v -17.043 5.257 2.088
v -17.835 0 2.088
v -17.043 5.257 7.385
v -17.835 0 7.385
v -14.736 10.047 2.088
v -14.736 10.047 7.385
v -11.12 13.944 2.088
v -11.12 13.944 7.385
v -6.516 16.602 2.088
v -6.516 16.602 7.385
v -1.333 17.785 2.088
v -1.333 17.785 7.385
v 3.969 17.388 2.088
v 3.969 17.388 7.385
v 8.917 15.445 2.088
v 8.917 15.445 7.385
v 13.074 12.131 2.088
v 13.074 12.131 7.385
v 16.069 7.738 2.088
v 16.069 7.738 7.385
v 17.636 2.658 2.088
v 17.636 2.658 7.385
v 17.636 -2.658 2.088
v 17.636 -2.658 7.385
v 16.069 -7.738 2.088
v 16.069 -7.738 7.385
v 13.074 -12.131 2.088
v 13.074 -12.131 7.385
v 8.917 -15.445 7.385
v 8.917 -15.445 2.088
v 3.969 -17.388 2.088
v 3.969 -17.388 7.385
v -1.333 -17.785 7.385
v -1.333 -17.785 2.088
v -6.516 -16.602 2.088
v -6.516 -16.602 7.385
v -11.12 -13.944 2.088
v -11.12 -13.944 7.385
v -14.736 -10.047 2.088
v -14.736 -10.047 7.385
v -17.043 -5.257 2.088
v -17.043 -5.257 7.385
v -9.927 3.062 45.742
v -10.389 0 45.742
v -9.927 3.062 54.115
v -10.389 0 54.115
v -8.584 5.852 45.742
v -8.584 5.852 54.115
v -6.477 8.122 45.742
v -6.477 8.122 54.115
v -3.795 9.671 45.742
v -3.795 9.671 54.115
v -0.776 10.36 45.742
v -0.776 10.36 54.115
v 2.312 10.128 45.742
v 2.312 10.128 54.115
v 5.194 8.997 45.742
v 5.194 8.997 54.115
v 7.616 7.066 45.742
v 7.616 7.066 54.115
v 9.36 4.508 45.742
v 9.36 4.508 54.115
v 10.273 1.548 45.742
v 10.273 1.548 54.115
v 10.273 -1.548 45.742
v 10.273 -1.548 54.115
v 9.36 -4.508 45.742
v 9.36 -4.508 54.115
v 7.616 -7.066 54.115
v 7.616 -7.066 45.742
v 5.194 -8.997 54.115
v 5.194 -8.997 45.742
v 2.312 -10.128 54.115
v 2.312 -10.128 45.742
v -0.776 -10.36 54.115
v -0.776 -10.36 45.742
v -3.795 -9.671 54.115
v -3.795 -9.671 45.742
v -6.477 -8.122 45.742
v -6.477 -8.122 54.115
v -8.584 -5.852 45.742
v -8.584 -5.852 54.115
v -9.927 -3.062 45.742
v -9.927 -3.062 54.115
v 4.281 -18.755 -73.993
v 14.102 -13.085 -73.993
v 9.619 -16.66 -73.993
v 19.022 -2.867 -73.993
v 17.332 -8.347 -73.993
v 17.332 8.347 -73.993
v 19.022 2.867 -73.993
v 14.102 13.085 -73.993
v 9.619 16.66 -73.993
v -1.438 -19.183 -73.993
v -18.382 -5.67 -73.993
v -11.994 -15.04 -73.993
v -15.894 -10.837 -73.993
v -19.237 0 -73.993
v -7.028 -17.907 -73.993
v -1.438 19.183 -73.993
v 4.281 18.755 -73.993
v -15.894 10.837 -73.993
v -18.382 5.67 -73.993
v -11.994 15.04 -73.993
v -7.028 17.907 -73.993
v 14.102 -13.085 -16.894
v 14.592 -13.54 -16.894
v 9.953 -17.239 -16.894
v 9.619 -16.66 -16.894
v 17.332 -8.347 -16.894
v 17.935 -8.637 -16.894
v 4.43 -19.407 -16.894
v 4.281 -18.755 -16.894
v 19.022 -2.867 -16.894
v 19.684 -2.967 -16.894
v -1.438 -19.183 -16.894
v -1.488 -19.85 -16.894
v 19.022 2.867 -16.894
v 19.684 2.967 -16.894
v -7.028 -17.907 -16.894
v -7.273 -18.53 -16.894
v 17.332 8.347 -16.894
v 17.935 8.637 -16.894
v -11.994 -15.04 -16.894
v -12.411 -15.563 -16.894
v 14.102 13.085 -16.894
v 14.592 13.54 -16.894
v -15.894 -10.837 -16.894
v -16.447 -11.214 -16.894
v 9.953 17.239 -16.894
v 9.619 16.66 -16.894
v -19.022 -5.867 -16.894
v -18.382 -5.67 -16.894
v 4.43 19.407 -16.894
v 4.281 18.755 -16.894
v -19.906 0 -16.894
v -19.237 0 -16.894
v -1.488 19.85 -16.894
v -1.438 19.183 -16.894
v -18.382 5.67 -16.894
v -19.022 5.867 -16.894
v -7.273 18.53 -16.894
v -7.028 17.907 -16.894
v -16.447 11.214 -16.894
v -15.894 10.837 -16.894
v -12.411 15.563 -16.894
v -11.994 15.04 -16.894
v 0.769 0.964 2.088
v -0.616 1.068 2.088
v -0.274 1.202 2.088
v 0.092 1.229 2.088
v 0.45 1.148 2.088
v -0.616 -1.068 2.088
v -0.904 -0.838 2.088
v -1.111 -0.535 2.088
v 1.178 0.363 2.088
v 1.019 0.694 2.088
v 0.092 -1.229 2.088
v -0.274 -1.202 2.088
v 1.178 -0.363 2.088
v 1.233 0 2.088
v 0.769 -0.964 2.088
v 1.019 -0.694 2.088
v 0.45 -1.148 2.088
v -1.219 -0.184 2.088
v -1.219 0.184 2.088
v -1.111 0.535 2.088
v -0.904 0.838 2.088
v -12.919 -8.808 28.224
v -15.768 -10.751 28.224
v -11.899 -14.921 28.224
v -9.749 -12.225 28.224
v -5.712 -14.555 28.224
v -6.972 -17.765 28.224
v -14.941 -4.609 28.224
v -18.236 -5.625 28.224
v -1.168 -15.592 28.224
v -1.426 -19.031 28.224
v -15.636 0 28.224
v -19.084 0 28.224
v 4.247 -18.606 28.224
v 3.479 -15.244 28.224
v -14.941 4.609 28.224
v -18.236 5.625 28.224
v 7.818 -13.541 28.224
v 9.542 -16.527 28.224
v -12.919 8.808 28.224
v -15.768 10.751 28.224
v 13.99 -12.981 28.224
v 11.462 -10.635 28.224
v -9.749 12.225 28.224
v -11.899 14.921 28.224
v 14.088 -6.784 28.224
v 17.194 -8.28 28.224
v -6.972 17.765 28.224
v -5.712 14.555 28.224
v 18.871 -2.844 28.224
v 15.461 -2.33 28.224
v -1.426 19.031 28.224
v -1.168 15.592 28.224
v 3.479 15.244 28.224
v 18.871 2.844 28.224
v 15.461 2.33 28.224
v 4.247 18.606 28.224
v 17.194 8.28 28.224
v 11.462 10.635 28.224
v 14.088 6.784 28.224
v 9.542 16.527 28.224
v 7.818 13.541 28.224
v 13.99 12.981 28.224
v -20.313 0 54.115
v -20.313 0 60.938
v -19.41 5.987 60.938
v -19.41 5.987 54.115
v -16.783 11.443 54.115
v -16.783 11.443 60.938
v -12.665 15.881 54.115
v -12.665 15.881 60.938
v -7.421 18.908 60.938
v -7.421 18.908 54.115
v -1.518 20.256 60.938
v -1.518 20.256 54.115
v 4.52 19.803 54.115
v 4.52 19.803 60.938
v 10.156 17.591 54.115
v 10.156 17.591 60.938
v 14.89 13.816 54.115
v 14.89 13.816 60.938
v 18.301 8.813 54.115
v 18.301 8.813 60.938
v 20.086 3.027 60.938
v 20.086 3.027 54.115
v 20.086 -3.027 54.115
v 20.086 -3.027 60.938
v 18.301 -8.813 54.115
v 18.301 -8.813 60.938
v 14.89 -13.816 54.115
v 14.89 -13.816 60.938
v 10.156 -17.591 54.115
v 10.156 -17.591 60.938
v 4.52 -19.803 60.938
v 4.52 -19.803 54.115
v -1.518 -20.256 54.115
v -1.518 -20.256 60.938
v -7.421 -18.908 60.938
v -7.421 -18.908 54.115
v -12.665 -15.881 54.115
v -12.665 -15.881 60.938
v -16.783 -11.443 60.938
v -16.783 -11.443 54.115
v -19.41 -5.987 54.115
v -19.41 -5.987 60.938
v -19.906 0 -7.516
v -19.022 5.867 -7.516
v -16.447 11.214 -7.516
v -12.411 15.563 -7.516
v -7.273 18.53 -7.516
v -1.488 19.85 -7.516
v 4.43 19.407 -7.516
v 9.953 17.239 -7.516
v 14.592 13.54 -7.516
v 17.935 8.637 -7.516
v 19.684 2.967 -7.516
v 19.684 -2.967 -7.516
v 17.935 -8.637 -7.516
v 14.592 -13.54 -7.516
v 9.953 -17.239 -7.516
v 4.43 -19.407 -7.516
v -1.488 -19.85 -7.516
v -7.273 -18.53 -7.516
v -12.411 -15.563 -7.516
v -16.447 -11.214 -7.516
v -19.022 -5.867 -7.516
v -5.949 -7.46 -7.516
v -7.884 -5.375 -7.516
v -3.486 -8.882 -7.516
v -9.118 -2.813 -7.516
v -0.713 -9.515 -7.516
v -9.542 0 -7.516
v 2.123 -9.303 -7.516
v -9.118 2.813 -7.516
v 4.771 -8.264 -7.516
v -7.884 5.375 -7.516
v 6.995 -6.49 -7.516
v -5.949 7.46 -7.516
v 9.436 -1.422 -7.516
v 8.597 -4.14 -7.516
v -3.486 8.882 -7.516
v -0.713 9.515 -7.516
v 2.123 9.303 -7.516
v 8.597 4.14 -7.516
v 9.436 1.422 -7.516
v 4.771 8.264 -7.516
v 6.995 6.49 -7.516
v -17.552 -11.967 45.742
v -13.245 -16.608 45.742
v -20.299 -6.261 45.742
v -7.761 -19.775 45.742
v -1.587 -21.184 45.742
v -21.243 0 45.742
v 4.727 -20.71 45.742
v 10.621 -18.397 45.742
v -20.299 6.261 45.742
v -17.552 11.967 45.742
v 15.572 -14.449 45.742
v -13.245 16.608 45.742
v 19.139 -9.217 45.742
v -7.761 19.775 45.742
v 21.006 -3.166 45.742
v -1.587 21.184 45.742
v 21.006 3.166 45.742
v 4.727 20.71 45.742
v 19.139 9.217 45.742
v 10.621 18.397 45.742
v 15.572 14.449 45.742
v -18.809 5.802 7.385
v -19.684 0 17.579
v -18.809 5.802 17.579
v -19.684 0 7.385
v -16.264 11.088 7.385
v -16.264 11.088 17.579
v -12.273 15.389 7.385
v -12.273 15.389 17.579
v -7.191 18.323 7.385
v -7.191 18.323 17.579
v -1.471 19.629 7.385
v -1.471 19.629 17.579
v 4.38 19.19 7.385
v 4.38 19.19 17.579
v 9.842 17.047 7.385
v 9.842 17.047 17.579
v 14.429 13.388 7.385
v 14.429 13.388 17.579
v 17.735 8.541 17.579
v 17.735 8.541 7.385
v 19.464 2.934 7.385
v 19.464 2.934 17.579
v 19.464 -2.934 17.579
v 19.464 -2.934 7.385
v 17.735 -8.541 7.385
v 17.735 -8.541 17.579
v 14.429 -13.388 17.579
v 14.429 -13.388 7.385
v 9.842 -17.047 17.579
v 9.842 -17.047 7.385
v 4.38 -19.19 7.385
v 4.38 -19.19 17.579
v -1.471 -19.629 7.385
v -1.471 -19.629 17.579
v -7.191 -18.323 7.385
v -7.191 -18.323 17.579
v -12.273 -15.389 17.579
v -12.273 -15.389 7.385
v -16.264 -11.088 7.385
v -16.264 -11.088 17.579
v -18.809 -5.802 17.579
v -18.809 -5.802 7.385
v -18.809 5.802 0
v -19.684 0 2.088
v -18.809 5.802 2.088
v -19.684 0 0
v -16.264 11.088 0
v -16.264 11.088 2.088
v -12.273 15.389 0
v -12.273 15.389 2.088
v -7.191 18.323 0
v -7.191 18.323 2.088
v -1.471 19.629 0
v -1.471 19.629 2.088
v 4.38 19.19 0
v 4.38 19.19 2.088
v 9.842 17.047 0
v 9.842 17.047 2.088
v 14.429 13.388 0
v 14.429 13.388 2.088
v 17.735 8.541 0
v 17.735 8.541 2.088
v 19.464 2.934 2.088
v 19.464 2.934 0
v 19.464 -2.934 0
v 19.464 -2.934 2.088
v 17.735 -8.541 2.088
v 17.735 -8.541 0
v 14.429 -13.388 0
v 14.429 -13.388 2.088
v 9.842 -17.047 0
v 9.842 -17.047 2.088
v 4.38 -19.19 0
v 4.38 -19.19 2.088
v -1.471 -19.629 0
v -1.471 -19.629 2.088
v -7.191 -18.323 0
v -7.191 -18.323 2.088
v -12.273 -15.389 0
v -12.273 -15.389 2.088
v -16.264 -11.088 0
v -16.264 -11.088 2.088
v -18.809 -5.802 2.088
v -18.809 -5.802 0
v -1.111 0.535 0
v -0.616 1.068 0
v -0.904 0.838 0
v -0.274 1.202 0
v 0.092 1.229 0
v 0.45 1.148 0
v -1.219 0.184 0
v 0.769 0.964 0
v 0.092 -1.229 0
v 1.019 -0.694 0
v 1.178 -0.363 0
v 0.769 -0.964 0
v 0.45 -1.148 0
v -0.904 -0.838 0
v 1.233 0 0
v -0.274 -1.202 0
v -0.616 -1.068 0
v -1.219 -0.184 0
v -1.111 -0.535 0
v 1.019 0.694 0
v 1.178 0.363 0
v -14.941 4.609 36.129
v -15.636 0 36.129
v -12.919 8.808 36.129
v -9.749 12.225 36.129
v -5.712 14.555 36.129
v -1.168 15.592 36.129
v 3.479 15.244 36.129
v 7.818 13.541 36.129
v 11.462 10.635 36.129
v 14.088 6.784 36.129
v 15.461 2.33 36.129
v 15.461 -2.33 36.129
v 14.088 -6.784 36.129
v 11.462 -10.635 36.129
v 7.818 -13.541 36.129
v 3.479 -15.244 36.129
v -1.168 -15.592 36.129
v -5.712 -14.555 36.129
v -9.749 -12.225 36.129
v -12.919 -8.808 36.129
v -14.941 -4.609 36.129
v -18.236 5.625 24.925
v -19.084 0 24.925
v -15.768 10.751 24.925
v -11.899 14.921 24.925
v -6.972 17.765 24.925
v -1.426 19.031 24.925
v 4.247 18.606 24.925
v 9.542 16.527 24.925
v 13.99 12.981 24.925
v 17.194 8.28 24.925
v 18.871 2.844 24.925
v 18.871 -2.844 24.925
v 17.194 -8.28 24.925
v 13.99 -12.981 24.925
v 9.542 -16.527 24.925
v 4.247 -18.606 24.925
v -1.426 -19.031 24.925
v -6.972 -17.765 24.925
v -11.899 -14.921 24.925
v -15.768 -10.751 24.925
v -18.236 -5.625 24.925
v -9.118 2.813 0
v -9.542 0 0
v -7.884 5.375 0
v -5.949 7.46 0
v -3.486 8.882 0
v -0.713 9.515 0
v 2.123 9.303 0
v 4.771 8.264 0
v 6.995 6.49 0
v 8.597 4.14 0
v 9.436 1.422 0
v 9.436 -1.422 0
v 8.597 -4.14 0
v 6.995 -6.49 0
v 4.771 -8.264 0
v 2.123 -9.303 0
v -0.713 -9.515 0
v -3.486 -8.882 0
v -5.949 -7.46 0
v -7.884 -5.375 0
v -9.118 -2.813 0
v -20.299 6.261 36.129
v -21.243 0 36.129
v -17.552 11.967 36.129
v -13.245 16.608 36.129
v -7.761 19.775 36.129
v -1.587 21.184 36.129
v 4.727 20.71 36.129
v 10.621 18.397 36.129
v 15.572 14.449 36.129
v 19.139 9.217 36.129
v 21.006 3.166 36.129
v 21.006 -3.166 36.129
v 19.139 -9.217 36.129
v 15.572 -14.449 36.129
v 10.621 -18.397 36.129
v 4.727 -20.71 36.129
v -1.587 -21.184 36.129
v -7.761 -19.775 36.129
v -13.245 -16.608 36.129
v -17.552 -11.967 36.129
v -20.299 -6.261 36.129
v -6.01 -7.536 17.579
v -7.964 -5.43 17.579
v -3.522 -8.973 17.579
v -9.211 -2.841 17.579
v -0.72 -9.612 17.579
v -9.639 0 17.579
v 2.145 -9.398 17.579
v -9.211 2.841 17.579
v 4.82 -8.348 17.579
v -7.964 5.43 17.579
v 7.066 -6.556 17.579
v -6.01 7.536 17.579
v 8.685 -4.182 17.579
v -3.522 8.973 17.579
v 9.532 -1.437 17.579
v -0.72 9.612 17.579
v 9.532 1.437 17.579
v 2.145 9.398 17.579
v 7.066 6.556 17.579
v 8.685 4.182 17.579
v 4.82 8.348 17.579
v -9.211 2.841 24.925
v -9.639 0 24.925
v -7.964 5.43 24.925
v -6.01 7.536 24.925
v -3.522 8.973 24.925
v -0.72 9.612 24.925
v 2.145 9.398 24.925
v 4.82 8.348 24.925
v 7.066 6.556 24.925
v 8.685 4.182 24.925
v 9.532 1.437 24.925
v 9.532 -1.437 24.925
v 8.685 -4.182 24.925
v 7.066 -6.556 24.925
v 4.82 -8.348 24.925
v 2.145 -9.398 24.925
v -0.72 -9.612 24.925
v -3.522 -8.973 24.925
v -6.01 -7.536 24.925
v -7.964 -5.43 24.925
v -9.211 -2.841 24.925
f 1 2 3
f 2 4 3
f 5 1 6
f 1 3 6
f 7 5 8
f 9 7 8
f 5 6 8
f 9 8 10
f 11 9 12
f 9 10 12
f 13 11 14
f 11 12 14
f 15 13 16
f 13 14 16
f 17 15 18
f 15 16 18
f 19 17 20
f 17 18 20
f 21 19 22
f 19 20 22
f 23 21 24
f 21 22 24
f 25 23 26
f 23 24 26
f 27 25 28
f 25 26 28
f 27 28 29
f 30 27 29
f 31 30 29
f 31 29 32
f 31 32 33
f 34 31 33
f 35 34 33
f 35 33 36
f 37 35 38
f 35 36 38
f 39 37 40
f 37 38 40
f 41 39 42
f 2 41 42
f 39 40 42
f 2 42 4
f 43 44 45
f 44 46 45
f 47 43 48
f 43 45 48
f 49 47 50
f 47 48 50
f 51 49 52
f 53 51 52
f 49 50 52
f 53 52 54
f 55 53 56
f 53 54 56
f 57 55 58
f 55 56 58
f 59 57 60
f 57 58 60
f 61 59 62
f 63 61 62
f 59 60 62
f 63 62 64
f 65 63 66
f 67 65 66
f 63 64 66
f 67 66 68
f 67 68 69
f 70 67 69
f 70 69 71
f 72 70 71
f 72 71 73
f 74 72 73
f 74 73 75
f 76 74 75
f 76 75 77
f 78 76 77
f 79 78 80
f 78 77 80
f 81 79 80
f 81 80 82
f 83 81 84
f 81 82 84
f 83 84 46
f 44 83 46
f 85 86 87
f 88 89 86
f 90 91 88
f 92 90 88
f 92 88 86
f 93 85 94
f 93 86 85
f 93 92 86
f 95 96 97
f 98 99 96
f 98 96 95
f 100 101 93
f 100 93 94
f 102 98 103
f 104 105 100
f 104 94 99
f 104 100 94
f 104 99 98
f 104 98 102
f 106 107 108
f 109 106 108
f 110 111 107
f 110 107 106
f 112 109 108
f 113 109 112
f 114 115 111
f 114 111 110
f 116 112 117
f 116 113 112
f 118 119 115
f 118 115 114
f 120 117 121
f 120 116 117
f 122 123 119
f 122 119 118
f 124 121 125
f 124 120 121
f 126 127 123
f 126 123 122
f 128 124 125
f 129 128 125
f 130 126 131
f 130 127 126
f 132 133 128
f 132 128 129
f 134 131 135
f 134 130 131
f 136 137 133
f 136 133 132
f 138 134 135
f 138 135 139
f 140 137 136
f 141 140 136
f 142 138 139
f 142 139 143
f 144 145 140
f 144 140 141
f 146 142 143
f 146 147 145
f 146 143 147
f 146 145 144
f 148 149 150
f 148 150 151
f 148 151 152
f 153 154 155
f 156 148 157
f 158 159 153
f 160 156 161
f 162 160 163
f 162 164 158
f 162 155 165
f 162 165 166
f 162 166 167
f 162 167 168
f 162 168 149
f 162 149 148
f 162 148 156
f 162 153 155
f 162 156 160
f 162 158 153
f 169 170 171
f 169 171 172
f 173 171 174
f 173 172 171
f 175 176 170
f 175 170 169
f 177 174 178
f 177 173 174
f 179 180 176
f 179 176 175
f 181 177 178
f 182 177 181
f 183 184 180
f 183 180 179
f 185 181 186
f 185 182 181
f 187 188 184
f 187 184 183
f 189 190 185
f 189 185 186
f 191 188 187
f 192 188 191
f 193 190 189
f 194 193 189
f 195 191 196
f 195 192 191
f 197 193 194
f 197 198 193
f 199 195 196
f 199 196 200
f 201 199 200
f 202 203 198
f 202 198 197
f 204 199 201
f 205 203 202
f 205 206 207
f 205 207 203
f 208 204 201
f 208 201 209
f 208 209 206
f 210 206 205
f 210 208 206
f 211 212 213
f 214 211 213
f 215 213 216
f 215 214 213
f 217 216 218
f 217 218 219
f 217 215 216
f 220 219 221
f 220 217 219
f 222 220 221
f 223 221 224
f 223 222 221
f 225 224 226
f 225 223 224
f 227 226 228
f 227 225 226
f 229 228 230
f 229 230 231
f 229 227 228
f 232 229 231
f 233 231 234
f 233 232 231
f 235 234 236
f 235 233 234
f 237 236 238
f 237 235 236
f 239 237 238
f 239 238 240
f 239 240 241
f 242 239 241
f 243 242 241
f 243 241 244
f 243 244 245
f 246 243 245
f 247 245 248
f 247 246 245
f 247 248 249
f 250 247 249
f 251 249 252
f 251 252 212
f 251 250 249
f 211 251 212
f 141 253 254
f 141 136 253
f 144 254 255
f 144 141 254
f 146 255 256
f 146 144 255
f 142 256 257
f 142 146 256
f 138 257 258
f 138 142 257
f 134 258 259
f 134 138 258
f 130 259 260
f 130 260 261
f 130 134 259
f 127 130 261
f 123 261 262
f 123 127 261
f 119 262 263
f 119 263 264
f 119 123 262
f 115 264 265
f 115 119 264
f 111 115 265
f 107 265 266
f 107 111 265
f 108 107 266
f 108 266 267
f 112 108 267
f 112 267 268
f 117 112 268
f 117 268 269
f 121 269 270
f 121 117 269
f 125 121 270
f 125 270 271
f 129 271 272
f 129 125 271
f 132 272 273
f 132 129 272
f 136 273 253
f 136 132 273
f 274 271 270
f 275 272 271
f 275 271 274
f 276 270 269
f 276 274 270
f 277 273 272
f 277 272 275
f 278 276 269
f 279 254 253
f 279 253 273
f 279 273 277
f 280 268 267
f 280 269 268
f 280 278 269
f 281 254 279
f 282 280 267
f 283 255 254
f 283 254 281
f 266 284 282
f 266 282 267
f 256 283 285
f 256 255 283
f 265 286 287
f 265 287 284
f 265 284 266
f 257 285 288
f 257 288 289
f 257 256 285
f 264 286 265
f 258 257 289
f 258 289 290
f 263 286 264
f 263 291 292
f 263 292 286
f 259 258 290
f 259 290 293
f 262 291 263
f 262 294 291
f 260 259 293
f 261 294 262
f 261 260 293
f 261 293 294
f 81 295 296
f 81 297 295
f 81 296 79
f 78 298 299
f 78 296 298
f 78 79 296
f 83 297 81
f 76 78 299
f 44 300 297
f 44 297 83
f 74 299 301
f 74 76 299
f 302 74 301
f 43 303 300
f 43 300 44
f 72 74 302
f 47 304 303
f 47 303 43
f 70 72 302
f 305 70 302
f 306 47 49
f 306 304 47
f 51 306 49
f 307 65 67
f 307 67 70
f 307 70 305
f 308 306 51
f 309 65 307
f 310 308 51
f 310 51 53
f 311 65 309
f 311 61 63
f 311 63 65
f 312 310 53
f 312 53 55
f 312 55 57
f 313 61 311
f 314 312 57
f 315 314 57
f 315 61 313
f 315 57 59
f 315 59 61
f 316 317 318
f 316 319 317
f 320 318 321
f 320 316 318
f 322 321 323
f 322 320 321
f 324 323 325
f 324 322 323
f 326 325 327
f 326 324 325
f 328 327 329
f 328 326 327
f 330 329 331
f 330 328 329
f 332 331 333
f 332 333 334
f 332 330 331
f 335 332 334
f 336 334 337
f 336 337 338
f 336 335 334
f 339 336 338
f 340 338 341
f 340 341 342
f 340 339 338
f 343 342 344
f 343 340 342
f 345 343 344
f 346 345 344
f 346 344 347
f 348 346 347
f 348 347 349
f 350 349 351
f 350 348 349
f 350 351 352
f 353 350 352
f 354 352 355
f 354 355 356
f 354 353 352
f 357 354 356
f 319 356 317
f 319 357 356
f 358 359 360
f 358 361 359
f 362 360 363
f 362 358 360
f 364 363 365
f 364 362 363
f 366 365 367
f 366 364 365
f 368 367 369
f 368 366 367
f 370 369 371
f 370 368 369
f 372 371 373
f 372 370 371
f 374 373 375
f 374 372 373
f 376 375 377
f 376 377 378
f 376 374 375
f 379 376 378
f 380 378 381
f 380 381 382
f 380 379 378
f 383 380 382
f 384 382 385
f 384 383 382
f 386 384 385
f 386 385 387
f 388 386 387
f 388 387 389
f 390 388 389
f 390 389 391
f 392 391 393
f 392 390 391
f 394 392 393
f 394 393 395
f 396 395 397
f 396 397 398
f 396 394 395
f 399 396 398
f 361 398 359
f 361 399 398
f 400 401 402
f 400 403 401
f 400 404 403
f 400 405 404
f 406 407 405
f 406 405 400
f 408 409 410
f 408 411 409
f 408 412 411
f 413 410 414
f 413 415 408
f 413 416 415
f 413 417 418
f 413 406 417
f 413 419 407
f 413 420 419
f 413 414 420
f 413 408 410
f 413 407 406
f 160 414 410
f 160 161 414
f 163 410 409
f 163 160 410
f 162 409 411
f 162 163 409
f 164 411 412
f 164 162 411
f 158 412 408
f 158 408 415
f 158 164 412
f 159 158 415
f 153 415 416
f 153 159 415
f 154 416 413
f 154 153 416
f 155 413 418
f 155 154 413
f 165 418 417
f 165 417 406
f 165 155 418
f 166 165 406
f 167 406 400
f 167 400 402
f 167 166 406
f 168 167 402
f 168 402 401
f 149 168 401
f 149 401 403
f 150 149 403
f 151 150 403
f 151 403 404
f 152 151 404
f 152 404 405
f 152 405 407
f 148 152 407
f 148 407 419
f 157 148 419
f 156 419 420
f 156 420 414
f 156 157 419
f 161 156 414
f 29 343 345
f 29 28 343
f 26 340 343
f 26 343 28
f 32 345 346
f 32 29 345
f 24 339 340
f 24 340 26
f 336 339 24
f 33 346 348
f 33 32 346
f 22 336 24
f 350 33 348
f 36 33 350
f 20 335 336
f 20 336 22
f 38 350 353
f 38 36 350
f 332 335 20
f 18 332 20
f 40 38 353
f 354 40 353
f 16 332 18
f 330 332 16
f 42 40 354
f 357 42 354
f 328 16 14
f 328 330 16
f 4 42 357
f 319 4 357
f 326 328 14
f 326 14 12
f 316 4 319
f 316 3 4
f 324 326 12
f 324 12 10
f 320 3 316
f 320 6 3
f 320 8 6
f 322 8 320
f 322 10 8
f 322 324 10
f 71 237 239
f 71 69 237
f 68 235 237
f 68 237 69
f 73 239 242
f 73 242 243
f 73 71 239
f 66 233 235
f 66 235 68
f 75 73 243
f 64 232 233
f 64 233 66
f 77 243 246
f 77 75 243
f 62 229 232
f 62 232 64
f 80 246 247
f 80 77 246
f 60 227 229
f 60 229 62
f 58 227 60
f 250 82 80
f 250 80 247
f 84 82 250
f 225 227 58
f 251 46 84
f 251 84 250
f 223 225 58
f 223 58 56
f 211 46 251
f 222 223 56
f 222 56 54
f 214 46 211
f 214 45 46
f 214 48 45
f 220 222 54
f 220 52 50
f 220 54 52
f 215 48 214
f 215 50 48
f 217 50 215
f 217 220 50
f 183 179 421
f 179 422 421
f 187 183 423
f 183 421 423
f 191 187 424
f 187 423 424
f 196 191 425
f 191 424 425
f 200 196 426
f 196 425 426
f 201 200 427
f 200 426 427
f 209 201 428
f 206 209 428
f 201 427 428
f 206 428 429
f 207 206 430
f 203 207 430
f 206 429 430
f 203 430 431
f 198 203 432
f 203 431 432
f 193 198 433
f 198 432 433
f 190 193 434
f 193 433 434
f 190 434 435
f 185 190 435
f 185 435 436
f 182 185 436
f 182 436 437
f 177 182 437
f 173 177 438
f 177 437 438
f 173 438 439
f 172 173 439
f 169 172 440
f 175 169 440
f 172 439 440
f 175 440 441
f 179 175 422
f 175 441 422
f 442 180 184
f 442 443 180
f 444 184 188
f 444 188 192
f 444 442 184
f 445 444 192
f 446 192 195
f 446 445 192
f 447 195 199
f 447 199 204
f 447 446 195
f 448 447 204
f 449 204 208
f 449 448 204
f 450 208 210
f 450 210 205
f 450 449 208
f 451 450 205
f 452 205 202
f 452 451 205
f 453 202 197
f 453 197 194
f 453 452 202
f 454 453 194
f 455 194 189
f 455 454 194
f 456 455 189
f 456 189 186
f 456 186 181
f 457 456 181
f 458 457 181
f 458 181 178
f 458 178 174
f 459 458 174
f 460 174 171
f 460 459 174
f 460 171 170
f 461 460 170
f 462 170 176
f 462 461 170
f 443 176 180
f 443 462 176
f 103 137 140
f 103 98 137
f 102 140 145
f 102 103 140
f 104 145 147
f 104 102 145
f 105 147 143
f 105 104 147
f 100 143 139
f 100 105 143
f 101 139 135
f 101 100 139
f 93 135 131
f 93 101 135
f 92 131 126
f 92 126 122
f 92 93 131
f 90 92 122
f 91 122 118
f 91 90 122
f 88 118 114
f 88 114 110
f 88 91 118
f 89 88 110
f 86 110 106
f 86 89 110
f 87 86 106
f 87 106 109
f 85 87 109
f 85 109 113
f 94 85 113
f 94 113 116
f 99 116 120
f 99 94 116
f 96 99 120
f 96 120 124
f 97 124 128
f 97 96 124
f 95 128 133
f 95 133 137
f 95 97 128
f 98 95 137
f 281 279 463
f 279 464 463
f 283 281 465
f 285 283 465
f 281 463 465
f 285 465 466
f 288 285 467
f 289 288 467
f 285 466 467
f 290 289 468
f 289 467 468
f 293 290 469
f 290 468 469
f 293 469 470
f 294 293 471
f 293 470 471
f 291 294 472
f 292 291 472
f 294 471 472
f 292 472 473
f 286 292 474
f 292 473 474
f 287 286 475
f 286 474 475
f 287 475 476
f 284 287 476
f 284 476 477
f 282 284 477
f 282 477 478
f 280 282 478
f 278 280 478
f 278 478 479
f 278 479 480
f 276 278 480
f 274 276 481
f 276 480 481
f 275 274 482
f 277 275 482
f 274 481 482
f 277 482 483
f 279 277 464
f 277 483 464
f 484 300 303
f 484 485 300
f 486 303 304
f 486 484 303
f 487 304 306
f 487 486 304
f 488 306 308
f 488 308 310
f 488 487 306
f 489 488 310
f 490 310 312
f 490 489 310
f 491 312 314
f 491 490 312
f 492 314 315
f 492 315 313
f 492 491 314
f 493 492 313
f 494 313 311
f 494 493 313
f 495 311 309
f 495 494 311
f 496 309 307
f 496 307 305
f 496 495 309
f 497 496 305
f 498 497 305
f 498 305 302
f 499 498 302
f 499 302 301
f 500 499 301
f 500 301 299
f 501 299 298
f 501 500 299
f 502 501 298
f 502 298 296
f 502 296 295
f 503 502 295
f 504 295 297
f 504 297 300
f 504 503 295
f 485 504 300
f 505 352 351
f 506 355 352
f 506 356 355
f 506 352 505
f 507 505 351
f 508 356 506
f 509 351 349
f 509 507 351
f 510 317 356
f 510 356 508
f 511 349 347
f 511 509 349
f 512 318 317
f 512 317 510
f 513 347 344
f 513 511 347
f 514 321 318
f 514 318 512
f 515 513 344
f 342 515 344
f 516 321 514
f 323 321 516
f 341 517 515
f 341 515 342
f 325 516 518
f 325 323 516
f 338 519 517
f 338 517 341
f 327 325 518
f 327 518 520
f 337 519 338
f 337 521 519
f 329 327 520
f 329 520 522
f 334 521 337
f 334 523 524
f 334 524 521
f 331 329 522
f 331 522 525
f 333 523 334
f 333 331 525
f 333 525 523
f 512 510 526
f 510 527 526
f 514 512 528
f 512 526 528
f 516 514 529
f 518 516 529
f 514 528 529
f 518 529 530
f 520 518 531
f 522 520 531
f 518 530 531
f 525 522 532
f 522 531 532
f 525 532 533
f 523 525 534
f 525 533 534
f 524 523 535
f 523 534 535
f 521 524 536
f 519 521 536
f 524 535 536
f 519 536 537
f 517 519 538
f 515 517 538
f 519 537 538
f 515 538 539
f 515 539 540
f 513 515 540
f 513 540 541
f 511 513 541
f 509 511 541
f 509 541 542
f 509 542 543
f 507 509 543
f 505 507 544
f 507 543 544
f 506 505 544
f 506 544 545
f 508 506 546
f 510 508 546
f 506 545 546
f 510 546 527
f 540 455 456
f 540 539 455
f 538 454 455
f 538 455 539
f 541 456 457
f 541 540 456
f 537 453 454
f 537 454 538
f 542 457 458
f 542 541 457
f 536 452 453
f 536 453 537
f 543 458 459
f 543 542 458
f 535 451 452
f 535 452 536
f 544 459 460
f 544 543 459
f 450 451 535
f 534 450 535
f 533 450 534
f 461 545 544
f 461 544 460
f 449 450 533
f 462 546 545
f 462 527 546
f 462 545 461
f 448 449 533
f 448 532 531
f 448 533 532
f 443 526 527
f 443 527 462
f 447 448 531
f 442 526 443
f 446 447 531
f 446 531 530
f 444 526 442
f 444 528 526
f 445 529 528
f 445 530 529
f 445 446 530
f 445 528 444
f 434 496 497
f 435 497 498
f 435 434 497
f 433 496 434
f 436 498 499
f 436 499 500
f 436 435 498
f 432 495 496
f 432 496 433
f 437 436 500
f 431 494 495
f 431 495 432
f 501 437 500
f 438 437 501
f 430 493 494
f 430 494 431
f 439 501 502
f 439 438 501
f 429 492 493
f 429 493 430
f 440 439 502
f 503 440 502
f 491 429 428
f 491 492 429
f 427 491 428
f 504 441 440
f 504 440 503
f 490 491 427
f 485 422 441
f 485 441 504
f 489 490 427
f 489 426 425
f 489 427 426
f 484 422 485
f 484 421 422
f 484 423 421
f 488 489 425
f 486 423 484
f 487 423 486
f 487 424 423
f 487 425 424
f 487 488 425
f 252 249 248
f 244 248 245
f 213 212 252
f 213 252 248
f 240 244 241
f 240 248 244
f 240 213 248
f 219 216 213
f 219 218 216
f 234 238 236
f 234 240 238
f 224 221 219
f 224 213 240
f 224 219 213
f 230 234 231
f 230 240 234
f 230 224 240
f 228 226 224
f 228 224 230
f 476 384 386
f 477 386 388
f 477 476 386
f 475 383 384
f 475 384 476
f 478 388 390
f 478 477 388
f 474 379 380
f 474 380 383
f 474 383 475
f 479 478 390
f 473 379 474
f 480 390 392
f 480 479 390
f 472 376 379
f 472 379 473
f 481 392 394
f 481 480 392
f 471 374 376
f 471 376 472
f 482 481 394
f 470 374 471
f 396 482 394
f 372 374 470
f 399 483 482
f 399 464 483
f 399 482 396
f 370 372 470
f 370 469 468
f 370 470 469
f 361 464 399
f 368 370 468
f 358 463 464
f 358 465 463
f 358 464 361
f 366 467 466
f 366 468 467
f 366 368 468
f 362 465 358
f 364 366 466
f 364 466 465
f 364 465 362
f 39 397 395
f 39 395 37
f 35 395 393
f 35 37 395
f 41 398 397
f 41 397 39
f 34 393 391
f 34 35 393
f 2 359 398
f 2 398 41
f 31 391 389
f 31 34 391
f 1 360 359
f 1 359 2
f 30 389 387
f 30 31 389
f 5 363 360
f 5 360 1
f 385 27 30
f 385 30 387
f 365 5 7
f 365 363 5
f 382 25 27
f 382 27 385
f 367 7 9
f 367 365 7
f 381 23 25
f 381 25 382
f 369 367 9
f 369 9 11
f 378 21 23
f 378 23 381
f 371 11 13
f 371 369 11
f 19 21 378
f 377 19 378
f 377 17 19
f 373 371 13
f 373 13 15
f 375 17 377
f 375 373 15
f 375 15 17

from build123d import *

# Parameters (mm, degrees)
F0_W   = 10.3888958693
F0_H   = 8.3731412888
F0_W_2 = 15.6360119581
F0_H_2 = 7.9048592597
F0_W_3 = 9.6391905099
F0_H_3 = 7.3461066931
F0_W_4 = 17.8349073976
F0_H_4 = 5.2964619827
F0_W_5 = 9.5420926809
F0_H_5 = 7.5158830732
F0_W_6 = 19.2370712757
F0_H_6 = 42.4508359283
F0_H_7 = 14.6481841803


with BuildPart() as f1:
    # F0 (on Front) → F1 (revolve)
    with BuildSketch(Plane.XZ):
        Polygon((0, 54.1152916849), (0, 60.9378516674), (-20.3126184642, 60.9378516674), (-20.3126184642, 54.1152916849), (-10.3888958693, 54.1152916849), align=None)
        with Locations((-5.1944479346, 49.9287210405)):
            Rectangle(F0_W, F0_H)
        Polygon((0, 36.1285470426), (0, 45.7421503961), (-10.3888958693, 45.7421503961), (-21.2429668754, 45.7421503961), (-21.2429668754, 36.1285470426), (-15.6360119581, 36.1285470426), align=None)
        with Locations((-7.8180059791, 32.1761174127)):
            Rectangle(F0_W_2, F0_H_2)
        Polygon((0, 24.9254349619), (0, 28.2236877829), (-15.6360119581, 28.2236877829), (-19.0841853619, 28.2236877829), (-19.0841853619, 24.9254349619), (-9.6391905099, 24.9254349619), align=None)
        with Locations((-4.819595255, 21.2523816153)):
            Rectangle(F0_W_3, F0_H_3)
        Polygon((0, 7.384730503), (0, 17.5793282688), (-9.6391905099, 17.5793282688), (-19.6838658303, 17.5793282688), (-19.6838658303, 7.384730503), (-17.8349073976, 7.384730503), align=None)
        with Locations((-8.9174536988, 4.7364995116)):
            Rectangle(F0_W_4, F0_H_4)
        Polygon((1.2327310396, 2.0882685203), (0, 2.0882685203), (-17.8349073976, 2.0882685203), (-19.6838658303, 2.0882685203), (-19.6838658303, 0), (-9.5420926809, 0), (0, 0), (1.2327310396, 0), align=None)
        with Locations((-4.7710463405, -3.7579415366)):
            Rectangle(F0_W_5, F0_H_5)
        Polygon((0, -16.8938729912), (0, -7.5158830732), (-9.5420926809, -7.5158830732), (-19.9061166495, -7.5158830732), (-19.9061166495, -16.8938729912), (-19.2370712757, -16.8938729912), align=None)
        with Locations((-9.6185356379, -38.1192909554)):
            Rectangle(F0_W_6, F0_H_6)
        with Locations((-9.6185356379, -66.6688010097)):
            Rectangle(F0_W_6, F0_H_7)
    revolve(axis=Axis((0, 0, -38.1192909554), (0, 0, -1)))


solid = f1.part
